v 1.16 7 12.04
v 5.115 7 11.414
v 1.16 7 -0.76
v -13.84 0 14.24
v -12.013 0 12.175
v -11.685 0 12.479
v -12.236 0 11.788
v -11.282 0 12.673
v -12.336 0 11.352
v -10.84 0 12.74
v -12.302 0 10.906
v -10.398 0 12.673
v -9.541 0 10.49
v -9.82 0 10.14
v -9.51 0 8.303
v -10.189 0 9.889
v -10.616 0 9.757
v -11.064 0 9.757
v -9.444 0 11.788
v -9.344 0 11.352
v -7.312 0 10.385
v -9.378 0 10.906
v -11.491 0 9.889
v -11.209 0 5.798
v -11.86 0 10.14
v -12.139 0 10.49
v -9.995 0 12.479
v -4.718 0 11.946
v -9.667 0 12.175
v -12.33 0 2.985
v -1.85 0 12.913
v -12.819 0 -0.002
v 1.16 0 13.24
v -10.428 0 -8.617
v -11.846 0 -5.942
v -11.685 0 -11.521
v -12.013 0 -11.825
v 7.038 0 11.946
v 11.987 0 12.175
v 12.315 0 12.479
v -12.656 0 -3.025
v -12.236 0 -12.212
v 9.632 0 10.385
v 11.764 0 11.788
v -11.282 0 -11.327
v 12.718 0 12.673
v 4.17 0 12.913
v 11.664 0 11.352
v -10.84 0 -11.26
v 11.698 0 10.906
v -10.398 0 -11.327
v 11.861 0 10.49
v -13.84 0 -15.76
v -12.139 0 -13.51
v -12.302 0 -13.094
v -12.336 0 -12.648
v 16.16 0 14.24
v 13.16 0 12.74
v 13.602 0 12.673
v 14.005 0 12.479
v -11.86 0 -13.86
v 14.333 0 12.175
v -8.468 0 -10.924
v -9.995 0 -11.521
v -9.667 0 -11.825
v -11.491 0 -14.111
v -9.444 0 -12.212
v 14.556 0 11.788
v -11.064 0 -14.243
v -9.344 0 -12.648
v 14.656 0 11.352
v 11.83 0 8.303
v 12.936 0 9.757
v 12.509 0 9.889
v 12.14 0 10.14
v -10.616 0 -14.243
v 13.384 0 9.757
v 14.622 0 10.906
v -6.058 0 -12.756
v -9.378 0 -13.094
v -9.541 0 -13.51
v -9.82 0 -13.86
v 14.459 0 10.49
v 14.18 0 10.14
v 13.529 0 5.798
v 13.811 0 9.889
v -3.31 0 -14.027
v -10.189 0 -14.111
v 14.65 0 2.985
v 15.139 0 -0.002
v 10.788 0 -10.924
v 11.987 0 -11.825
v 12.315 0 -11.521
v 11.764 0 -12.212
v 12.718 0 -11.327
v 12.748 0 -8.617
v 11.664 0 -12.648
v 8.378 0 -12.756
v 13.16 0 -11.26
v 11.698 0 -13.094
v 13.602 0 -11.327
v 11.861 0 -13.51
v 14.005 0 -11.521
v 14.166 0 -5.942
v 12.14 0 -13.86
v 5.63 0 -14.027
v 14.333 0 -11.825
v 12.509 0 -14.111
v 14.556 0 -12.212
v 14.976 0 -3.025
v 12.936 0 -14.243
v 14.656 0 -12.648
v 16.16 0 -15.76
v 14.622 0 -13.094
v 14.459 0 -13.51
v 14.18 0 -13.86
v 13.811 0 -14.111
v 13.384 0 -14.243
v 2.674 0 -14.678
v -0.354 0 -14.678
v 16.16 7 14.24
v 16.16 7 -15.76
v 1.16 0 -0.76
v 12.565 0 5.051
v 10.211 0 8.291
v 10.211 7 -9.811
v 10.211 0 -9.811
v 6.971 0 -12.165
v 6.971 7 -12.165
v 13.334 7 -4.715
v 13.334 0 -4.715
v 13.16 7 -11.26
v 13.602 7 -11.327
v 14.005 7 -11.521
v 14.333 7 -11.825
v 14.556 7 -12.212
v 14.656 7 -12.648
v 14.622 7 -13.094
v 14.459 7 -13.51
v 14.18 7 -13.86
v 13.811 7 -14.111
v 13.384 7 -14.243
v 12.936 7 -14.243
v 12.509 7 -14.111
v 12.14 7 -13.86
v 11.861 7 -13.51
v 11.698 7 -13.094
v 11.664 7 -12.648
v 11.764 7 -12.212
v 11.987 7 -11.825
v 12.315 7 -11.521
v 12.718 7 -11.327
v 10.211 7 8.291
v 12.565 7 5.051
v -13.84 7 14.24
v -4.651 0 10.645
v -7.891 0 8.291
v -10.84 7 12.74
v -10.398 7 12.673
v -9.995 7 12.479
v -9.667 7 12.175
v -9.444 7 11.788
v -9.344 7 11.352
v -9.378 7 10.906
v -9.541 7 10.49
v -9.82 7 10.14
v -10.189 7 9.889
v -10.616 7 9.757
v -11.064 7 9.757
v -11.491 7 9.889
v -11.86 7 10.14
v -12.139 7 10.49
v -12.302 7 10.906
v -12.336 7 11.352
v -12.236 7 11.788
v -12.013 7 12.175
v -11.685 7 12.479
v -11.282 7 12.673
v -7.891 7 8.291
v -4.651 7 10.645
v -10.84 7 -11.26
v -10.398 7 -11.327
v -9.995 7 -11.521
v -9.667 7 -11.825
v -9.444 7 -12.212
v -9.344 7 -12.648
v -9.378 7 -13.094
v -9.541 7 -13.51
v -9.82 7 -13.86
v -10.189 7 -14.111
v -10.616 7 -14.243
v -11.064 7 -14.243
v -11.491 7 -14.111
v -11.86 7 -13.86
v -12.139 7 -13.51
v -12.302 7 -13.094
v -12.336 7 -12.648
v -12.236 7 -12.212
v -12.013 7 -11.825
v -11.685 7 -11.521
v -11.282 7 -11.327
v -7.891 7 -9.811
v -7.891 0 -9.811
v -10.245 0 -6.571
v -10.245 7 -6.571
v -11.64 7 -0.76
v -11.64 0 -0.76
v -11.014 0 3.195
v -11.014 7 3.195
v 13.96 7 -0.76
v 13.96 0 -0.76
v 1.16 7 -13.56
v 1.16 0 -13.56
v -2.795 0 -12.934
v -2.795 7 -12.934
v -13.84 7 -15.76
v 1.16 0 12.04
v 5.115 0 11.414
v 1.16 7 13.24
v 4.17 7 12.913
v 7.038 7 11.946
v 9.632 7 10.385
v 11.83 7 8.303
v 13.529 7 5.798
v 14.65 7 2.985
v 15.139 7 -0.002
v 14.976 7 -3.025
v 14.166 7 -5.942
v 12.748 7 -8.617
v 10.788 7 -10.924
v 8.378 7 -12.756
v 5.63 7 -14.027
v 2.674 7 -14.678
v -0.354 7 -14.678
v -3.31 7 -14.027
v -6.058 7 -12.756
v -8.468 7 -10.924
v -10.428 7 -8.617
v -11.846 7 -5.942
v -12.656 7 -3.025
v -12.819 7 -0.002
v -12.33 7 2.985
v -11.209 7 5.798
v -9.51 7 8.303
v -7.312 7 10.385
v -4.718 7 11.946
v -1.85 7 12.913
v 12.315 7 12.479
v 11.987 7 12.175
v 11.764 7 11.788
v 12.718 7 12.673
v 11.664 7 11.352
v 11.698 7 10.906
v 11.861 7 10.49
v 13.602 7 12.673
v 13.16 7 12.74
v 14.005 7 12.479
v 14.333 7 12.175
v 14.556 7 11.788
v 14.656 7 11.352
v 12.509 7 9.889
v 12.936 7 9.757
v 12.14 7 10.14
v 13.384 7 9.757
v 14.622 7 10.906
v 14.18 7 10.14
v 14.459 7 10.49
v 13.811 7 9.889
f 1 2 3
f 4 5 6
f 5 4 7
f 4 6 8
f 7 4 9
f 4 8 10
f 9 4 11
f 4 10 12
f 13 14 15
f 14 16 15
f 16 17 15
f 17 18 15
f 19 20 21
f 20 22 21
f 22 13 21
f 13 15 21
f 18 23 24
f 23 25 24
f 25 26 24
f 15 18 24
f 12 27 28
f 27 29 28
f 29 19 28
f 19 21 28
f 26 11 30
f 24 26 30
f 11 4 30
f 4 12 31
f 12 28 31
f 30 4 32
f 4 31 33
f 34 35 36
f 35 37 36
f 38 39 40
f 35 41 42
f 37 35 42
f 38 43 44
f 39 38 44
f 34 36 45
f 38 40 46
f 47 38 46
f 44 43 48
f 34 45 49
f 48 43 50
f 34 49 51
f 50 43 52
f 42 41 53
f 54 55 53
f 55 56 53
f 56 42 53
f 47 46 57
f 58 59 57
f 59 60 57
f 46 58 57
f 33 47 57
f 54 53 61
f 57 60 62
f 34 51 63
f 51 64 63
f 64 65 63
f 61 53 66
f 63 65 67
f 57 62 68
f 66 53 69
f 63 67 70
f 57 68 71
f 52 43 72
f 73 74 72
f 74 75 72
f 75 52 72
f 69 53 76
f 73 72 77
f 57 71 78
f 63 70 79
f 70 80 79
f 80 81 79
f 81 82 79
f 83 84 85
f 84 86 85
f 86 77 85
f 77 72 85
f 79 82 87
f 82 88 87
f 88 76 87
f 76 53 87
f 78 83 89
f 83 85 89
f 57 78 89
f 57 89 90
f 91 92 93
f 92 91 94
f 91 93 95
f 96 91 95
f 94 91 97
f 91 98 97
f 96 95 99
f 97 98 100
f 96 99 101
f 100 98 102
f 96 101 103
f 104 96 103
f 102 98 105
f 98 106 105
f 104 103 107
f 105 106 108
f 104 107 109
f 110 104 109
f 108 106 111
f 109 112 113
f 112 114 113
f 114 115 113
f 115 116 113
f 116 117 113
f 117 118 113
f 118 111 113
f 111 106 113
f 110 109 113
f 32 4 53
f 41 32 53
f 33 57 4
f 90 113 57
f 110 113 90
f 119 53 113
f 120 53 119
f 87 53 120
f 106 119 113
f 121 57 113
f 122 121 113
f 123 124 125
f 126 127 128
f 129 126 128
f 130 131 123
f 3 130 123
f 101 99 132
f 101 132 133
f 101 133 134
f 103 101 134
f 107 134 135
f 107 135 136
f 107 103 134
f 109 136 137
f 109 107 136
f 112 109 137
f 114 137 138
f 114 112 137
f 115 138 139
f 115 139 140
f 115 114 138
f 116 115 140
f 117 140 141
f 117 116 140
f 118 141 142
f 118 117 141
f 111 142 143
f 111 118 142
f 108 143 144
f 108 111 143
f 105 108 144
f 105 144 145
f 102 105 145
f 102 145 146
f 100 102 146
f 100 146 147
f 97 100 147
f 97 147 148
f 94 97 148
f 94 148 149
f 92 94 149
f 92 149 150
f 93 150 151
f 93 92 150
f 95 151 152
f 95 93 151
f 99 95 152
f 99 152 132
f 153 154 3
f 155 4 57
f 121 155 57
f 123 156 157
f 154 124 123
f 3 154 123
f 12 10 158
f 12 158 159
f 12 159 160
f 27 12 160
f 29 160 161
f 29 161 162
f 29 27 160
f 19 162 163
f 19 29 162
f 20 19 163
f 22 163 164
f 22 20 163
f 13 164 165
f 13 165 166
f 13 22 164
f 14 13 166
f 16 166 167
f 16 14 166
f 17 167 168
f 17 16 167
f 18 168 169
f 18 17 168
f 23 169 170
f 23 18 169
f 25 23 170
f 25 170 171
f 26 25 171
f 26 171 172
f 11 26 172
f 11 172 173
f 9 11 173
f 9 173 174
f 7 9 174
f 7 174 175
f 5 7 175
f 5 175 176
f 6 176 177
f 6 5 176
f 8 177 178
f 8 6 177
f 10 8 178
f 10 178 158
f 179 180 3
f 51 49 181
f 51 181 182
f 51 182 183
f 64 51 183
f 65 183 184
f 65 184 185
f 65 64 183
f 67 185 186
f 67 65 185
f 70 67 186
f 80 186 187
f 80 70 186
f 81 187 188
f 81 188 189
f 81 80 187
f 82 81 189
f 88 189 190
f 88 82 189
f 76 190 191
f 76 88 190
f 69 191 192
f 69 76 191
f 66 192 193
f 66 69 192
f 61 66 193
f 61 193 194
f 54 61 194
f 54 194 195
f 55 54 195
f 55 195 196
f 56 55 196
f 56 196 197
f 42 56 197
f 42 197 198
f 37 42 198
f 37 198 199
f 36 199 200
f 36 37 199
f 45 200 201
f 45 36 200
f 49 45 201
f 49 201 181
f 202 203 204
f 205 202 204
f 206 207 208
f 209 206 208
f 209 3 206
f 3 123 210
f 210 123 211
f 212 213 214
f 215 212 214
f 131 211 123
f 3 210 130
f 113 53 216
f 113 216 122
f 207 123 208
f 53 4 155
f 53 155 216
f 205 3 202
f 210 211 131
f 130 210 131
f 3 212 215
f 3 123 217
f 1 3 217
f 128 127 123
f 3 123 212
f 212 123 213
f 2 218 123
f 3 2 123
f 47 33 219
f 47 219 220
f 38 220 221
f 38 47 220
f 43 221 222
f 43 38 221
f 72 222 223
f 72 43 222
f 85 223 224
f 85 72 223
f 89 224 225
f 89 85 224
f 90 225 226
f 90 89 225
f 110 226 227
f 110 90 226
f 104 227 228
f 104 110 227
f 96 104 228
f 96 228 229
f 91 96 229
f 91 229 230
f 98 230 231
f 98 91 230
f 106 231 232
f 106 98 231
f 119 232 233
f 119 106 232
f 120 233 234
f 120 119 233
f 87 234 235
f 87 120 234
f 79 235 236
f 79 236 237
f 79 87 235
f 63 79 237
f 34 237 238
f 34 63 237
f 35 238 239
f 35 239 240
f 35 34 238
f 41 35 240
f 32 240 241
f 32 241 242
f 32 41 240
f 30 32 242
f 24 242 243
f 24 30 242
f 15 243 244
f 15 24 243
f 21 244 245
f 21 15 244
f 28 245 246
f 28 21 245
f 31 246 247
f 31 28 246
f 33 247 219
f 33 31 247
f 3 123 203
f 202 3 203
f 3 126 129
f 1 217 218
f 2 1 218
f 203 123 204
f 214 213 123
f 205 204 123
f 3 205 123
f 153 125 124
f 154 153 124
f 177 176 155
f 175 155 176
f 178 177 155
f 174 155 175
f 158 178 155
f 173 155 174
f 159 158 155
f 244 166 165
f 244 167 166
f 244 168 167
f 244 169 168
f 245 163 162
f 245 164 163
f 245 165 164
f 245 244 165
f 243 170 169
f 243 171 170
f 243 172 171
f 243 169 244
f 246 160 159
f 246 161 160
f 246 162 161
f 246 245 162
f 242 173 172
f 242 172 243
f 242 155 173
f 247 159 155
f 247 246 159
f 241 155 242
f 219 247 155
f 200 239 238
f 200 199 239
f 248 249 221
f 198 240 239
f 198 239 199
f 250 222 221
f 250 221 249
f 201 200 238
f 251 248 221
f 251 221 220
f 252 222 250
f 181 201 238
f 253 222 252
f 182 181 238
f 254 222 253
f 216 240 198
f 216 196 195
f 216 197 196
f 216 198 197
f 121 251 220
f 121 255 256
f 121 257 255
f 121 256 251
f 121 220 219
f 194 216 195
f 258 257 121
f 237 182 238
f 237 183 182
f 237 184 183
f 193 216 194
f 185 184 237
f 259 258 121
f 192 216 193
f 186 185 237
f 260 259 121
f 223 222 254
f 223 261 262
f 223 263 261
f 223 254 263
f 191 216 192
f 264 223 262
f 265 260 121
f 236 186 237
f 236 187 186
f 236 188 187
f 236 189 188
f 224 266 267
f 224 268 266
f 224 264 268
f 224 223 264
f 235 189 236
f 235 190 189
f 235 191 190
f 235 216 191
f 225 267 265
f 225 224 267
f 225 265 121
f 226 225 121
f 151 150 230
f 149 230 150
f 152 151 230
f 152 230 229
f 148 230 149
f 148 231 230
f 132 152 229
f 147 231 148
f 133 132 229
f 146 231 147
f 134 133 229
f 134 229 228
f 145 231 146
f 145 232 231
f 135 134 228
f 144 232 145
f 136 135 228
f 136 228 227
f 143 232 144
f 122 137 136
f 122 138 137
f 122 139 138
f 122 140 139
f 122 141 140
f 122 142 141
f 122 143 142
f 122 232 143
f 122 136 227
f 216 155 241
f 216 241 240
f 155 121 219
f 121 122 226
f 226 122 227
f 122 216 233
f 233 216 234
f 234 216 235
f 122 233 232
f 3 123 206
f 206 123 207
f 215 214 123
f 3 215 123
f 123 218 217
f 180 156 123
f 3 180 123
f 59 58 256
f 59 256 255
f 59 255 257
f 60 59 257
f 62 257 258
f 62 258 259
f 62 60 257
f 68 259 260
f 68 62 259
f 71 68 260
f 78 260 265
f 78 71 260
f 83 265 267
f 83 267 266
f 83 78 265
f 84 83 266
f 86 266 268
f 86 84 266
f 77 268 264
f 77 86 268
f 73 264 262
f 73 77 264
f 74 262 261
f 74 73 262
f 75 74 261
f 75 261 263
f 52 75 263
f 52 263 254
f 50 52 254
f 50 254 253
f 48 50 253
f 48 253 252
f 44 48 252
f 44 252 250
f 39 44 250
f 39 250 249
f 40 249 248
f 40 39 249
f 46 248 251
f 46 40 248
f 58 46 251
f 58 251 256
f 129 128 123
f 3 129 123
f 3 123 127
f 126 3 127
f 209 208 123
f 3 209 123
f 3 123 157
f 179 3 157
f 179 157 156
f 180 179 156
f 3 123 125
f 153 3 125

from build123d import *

# Parameters (mm, degrees)
SKETCH_1_W        = 30
SKETCH_1_H        = 30
SKETCH_1_R        = 1.5
SKETCH_1_R_2      = 14
EXTRUDE_1_DEPTH   = 7
EXTRUDE_2_DEPTH   = 7
EXTRUDE_2_2_DEPTH = 7
EXTRUDE_2_3_DEPTH = 7
EXTRUDE_2_4_DEPTH = 7
EXTRUDE_2_5_DEPTH = 7
EXTRUDE_2_6_DEPTH = 7
EXTRUDE_2_7_DEPTH = 7
EXTRUDE_2_8_DEPTH = 7


with BuildPart() as part:
    # 草图1 → 凸台-拉伸1 (new body)
    with BuildSketch(Plane(origin=(0, 0, 0), x_dir=(1, 0, 0), z_dir=(0, 1, 0))):
        with Locations((1.16, 0.76)):
            Rectangle(SKETCH_1_W, SKETCH_1_H)
        with Locations(Location((-10.84, 12.76, 0), (0, 0, 270))):
            Circle(SKETCH_1_R, mode=Mode.SUBTRACT)
        with Locations(Location((-10.84, -11.24, 0), (0, 0, 270))):
            Circle(SKETCH_1_R, mode=Mode.SUBTRACT)
        with Locations(Location((13.16, -11.24, 0), (0, 0, 270))):
            Circle(SKETCH_1_R, mode=Mode.SUBTRACT)
        with Locations(Location((13.16, 12.76, 0), (0, 0, 270))):
            Circle(SKETCH_1_R, mode=Mode.SUBTRACT)
        with Locations(Location((1.16, 0.76, 0), (0, 0, 270))):
            Circle(SKETCH_1_R_2, mode=Mode.SUBTRACT)
    extrude(amount=EXTRUDE_1_DEPTH)


with BuildPart() as body_2:
    # 草图2 → 凸台-拉伸2 (new body)
    with BuildSketch(Plane.XZ):
        Polygon((1.16, -0.76), (10.210966799, -9.810966799), (6.971078397, -12.16488351), align=None)
    extrude(amount=-EXTRUDE_2_DEPTH)


with BuildPart() as body_3:
    # 草图2 → Extrude 2 2 (new body)
    with BuildSketch(Plane.XZ):
        Polygon((-2.795417528, -12.933523409), (1.16, -0.76), (1.16, -13.56), align=None)
    extrude(amount=-EXTRUDE_2_2_DEPTH)


with BuildPart() as body_4:
    # 草图2 → Extrude 2 3 (new body)
    with BuildSketch(Plane.XZ):
        Polygon((1.16, -0.76), (-7.890966799, -9.810966799), (-10.24488351, -6.571078397), align=None)
    extrude(amount=-EXTRUDE_2_3_DEPTH)


with BuildPart() as body_5:
    # 草图2 → Extrude 2 4 (new body)
    with BuildSketch(Plane.XZ):
        Polygon((1.16, -0.76), (-11.64, -0.76), (-11.013523409, 3.195417528), align=None)
    extrude(amount=-EXTRUDE_2_4_DEPTH)


with BuildPart() as body_6:
    # 草图2 → Extrude 2 5 (new body)
    with BuildSketch(Plane.XZ):
        Polygon((1.16, -0.76), (-7.890966799, 8.290966799), (-4.651078397, 10.64488351), align=None)
    extrude(amount=-EXTRUDE_2_5_DEPTH)


with BuildPart() as body_7:
    # 草图2 → Extrude 2 6 (new body)
    with BuildSketch(Plane.XZ):
        Polygon((1.16, -0.76), (1.16, 12.04), (5.115417528, 11.413523409), align=None)
    extrude(amount=-EXTRUDE_2_6_DEPTH)


with BuildPart() as body_8:
    # 草图2 → Extrude 2 7 (new body)
    with BuildSketch(Plane.XZ):
        Polygon((1.16, -0.76), (10.210966799, 8.290966799), (12.56488351, 5.051078397), align=None)
    extrude(amount=-EXTRUDE_2_7_DEPTH)


with BuildPart() as body_9:
    # 草图2 → Extrude 2 8 (new body)
    with BuildSketch(Plane.XZ):
        Polygon((1.16, -0.76), (13.96, -0.76), (13.333523409, -4.715417528), align=None)
    extrude(amount=-EXTRUDE_2_8_DEPTH)


solid = Compound([part.part, body_2.part, body_3.part, body_4.part, body_5.part, body_6.part, body_7.part, body_8.part, body_9.part])
